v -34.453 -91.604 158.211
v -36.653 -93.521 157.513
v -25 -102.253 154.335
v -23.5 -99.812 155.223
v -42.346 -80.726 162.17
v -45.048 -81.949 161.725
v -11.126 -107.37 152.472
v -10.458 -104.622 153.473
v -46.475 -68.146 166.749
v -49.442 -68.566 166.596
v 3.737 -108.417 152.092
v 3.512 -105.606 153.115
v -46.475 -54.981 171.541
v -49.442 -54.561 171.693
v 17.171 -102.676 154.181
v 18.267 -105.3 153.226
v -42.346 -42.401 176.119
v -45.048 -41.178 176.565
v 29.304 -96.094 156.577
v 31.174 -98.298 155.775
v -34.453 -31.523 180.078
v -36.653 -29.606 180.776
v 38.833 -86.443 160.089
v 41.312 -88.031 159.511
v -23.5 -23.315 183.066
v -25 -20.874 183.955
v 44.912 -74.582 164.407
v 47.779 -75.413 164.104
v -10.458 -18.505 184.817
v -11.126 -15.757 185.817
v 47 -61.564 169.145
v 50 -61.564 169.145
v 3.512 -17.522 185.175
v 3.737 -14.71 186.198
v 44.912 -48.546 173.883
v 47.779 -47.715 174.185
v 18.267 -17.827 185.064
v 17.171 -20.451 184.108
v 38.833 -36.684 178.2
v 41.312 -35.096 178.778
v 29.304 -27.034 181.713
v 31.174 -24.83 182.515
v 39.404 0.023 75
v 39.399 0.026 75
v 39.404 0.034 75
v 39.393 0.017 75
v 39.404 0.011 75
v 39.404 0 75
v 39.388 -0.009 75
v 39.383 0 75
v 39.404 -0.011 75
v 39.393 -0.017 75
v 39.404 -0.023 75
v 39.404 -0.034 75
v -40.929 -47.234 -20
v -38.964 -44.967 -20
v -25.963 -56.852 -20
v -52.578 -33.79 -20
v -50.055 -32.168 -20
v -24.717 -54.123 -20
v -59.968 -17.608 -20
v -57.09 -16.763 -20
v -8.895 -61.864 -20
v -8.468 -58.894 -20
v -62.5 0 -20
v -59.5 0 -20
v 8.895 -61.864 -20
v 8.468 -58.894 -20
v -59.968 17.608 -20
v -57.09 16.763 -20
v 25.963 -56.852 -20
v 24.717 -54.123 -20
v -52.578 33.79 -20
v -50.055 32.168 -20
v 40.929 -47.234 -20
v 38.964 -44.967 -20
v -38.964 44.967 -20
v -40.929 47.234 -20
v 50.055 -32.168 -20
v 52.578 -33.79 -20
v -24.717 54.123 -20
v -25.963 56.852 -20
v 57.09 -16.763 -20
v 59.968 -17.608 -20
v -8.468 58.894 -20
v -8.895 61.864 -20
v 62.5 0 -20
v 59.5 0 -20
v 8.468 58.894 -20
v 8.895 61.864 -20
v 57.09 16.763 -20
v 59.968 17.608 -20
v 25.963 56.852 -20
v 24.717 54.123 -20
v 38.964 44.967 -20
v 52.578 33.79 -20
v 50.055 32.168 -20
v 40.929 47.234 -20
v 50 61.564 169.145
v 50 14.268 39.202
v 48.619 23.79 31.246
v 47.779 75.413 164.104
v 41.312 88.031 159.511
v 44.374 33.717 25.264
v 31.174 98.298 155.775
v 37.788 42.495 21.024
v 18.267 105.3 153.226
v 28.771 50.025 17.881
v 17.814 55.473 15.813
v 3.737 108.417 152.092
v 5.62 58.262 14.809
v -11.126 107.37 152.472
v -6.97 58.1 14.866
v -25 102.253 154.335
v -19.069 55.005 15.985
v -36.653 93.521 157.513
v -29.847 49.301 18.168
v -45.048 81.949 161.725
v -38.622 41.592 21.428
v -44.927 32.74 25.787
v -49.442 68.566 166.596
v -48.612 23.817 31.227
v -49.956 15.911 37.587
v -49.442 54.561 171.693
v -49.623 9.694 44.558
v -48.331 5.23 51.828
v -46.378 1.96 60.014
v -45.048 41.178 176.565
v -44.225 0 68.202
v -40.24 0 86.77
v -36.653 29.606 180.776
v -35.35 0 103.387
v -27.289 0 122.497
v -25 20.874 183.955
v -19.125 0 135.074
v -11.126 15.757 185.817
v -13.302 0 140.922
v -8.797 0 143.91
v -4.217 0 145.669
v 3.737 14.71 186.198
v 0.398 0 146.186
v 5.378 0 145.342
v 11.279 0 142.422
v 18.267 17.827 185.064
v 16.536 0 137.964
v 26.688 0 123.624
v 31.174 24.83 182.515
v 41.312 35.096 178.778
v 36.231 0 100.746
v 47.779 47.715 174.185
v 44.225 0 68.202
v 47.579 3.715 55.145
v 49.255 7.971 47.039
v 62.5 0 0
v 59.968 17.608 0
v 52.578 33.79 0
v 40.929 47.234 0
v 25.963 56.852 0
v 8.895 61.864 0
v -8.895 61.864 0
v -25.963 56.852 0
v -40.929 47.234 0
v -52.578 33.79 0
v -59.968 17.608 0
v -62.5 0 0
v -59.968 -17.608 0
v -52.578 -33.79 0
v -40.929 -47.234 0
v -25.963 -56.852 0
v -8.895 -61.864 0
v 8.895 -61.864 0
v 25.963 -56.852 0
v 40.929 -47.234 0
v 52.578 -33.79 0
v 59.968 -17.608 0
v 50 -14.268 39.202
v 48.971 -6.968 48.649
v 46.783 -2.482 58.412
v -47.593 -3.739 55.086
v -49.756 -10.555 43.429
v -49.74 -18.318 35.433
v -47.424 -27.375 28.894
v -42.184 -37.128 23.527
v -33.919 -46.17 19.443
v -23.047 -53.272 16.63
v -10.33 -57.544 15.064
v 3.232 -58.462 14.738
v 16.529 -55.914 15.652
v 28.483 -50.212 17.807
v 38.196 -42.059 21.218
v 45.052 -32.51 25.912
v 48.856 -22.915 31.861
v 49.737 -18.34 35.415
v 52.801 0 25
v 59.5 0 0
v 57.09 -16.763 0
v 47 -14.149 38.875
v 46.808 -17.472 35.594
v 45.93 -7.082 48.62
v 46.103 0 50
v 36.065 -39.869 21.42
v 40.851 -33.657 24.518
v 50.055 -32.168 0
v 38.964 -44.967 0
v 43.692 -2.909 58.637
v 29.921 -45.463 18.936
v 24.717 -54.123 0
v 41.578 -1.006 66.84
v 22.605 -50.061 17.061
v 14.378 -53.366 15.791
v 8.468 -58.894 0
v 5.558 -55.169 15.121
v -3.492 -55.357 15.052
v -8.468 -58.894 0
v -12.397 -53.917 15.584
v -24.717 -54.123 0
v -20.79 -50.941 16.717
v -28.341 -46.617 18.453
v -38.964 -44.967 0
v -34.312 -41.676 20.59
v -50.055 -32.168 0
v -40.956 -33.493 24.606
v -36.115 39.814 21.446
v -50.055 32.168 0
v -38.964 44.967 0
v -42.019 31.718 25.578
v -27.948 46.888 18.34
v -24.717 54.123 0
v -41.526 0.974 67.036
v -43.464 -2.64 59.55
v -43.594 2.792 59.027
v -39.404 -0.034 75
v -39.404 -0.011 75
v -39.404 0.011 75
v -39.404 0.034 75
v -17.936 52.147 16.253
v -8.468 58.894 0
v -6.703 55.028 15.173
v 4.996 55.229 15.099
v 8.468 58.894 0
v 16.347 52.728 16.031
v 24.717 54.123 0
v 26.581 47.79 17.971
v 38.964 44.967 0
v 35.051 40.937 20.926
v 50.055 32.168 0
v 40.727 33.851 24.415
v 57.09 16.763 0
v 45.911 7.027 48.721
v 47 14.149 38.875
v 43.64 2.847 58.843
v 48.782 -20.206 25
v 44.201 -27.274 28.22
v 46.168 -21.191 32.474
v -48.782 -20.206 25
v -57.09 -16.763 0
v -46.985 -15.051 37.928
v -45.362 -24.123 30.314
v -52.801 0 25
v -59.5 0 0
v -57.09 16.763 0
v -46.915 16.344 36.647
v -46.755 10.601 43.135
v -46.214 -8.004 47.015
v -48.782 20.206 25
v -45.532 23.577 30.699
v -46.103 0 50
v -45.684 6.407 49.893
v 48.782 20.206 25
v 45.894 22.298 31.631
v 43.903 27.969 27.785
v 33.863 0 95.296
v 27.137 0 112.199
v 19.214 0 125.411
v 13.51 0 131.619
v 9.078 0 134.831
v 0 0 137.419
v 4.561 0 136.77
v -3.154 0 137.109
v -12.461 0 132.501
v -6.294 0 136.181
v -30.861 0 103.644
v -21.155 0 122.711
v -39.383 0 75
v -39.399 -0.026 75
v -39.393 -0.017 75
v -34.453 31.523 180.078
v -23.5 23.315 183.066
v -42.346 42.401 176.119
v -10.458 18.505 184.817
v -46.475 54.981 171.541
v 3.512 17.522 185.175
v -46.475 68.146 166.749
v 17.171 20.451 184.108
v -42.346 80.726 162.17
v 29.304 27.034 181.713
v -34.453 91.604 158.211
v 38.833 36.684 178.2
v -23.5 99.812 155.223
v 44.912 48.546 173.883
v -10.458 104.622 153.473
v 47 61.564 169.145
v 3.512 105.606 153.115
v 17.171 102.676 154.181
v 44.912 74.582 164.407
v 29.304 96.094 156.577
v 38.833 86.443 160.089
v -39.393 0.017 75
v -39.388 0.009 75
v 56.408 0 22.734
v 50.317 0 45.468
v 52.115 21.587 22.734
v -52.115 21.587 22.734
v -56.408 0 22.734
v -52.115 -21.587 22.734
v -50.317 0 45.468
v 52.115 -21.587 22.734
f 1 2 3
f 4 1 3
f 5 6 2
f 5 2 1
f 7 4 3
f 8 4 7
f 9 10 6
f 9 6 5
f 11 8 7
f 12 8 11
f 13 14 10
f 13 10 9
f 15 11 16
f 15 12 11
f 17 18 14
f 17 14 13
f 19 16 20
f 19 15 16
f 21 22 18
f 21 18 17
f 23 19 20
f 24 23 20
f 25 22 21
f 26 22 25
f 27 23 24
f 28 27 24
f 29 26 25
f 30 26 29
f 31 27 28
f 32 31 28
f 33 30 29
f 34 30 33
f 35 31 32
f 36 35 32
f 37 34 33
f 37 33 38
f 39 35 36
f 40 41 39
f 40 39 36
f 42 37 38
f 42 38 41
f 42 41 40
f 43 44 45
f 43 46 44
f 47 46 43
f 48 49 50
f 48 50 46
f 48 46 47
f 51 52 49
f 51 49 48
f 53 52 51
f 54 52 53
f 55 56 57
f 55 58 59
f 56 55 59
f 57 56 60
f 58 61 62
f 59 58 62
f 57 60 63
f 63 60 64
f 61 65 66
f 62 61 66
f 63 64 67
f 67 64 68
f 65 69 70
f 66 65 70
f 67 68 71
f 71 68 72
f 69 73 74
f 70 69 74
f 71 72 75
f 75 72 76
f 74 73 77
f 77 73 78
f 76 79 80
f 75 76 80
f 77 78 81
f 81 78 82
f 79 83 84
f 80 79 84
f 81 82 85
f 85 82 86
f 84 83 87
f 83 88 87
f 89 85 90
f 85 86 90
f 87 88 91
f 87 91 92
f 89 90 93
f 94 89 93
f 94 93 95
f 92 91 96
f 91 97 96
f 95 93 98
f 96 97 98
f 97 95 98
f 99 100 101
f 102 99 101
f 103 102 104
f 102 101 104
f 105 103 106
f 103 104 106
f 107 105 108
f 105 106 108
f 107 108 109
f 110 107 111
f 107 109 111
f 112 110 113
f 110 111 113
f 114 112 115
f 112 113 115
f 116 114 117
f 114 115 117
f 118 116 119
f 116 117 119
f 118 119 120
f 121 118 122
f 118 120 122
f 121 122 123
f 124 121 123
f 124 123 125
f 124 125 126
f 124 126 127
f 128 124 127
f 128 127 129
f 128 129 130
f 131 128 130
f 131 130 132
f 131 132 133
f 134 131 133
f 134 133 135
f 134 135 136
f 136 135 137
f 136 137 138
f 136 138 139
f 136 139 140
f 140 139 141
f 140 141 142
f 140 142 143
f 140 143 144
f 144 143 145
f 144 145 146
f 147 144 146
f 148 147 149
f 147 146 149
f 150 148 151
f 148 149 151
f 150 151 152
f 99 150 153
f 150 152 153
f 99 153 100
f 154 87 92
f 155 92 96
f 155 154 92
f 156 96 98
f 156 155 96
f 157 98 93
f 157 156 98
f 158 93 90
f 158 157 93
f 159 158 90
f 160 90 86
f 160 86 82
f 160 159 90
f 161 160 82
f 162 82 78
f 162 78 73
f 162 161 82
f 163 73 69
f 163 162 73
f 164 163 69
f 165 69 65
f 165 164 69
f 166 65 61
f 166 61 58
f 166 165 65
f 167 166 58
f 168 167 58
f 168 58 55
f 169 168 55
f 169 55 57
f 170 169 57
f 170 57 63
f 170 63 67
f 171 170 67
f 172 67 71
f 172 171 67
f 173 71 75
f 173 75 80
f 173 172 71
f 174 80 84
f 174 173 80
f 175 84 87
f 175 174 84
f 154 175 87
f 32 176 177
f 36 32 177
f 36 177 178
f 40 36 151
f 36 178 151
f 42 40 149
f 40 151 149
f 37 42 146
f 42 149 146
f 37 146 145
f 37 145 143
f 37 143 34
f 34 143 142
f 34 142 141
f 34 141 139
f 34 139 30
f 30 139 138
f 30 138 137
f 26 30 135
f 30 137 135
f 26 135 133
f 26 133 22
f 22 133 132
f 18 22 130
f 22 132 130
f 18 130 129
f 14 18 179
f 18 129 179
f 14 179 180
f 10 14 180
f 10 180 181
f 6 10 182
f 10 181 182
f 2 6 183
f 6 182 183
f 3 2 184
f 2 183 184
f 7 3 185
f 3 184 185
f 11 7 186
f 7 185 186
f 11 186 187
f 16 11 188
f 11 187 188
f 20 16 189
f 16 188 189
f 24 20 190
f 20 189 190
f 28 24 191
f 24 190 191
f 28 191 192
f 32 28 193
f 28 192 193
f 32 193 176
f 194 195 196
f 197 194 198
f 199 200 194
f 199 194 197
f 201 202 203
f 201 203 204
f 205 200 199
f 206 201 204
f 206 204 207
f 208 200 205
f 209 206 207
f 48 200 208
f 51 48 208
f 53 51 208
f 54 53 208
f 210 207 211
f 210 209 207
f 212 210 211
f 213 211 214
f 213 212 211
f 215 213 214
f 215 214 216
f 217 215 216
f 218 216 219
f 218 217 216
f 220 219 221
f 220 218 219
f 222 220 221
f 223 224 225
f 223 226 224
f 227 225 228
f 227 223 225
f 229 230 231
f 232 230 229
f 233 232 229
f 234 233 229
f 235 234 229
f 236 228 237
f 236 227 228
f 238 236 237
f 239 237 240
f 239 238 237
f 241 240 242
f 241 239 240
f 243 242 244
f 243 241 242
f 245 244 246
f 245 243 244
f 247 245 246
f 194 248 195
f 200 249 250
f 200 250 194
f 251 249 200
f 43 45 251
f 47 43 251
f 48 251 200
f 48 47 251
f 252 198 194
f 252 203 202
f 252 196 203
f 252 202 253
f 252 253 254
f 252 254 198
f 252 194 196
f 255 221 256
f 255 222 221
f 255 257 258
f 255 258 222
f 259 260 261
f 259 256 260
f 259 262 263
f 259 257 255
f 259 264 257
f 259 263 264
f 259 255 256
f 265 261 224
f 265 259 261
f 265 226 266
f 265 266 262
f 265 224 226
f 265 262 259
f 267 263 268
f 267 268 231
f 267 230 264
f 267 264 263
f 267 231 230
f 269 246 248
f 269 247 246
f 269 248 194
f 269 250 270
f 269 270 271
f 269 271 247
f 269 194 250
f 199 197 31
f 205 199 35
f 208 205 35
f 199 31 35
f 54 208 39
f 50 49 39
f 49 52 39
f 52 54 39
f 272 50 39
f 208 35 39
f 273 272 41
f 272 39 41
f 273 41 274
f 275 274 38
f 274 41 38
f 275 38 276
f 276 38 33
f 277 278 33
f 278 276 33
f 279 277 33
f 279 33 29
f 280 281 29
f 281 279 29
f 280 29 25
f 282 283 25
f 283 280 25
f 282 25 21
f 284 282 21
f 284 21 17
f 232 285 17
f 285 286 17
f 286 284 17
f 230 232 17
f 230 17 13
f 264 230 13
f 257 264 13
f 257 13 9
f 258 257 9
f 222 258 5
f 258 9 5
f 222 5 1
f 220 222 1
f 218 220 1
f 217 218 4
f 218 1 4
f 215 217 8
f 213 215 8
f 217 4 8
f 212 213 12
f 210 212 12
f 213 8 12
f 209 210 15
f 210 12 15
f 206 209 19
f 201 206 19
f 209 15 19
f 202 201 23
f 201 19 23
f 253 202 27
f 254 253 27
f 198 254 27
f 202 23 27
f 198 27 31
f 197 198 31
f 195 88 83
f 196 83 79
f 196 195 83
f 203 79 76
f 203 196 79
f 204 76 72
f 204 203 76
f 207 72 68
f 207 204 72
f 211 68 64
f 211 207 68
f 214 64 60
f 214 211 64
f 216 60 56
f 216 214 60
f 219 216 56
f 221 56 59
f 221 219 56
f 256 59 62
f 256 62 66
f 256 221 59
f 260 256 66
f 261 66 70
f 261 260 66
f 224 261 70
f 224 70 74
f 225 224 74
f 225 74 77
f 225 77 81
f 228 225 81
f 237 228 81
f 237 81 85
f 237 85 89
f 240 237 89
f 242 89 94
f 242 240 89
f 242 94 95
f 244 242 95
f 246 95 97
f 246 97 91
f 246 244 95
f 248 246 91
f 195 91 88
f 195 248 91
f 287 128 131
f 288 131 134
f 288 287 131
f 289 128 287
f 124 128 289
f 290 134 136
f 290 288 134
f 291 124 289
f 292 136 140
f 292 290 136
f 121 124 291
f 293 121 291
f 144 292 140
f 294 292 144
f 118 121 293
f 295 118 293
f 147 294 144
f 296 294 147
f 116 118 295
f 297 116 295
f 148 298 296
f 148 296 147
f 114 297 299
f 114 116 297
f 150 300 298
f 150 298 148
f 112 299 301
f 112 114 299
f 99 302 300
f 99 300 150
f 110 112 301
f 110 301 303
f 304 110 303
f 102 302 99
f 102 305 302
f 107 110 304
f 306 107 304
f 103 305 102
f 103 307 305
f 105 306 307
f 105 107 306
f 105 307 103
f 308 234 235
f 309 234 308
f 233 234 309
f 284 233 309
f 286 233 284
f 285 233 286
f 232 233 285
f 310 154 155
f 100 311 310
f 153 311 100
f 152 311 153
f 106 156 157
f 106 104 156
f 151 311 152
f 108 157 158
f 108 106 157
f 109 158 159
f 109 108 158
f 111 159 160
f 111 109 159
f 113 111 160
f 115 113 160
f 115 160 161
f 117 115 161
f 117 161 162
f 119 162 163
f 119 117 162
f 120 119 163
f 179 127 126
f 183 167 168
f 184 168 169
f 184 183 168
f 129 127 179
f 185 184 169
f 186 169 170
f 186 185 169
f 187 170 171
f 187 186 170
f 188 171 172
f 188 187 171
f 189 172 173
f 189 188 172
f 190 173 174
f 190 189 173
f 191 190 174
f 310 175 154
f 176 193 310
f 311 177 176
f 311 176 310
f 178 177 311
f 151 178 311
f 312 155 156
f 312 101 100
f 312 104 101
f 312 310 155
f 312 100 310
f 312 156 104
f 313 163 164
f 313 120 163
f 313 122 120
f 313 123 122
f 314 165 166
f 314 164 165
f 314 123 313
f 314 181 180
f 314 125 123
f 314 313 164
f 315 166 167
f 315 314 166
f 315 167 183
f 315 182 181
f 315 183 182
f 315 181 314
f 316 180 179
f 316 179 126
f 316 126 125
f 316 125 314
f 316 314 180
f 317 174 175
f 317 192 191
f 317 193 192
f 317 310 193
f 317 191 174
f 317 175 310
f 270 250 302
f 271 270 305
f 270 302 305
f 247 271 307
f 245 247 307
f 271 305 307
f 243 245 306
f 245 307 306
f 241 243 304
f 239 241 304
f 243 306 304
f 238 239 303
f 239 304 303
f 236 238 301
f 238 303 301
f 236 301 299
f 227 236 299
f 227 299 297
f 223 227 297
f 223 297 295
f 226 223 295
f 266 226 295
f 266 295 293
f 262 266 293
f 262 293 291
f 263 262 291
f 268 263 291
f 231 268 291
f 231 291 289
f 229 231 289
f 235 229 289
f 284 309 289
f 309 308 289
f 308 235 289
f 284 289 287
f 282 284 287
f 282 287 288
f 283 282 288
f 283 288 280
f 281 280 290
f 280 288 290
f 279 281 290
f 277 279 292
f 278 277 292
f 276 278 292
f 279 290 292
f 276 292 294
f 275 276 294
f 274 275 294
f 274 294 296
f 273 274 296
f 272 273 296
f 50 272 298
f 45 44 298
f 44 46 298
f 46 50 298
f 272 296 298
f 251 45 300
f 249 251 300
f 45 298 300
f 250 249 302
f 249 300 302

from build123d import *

# Parameters (mm, degrees)
SKETCH_R        = 62.5
PAD_DEPTH       = 100
PAD_TAPER       = 15
SKETCH001_R     = 50
PAD001_DEPTH    = 180
SKETCH002_R     = 50
PAD002_DEPTH    = 180
SKETCH003_R     = 47
POCKET_DEPTH    = 233.196381
SKETCH004_R     = 47
POCKET001_DEPTH = 233.196381
SKETCH005_R     = 59.5
POCKET002_DEPTH = 75
POCKET002_TAPER = 15
PAD003_DEPTH    = 20
POCKET003_DEPTH = 20


with BuildPart() as part:
    # Sketch → Pad (new body)
    with BuildSketch(Plane.XY):
        Circle(SKETCH_R)
    extrude(amount=PAD_DEPTH, taper=PAD_TAPER)

    # Sketch001 (on DatumPlane) → Pad001 (join)
    with BuildSketch(Plane(origin=(0, 0, 0), x_dir=(1, 0, 0), z_dir=(0, 0.34202, 0.939693))):
        Circle(SKETCH001_R)
    extrude(amount=PAD001_DEPTH)

    # Sketch002 (on DatumPlane) → Pad002 (join)
    with BuildSketch(Plane(origin=(0, 0, 0), x_dir=(1, 0, 0), z_dir=(0, -0.34202, 0.939693))):
        Circle(SKETCH002_R)
    extrude(amount=PAD002_DEPTH)

    # Sketch003 (on Face7 of Pad002) → Pocket (cut, through all)
    with BuildSketch(Plane(origin=(0, 61.563626, 169.144672), x_dir=(1, 0, 0), z_dir=(0, 0.34202, 0.939693))):
        Circle(SKETCH003_R)
    extrude(amount=-POCKET_DEPTH, mode=Mode.SUBTRACT)

    # Sketch004 (on Face8 of Pocket) → Pocket001 (cut, through all)
    with BuildSketch(Plane(origin=(0, -61.563626, 169.144672), x_dir=(1, 0, 0), z_dir=(0, -0.34202, 0.939693))):
        Circle(SKETCH004_R)
    extrude(amount=-POCKET001_DEPTH, mode=Mode.SUBTRACT)

    # Sketch005 (on Face2 of Pocket001) → Pocket002 (cut)
    with BuildSketch(Plane(origin=(0, 0, 0), x_dir=(1, 0, 0), z_dir=(0, 0, -1))):
        Circle(SKETCH005_R)
    extrude(amount=-POCKET002_DEPTH, taper=POCKET002_TAPER, mode=Mode.SUBTRACT)

    # Sketch → Pad003 (join)
    with BuildSketch(Plane.XY):
        Circle(SKETCH_R)
    extrude(amount=-PAD003_DEPTH)

    # Sketch005 (on Face2 of Pocket001) → Pocket003 (cut)
    with BuildSketch(Plane(origin=(0, 0, 0), x_dir=(1, 0, 0), z_dir=(0, 0, -1))):
        Circle(SKETCH005_R)
    extrude(amount=POCKET003_DEPTH, mode=Mode.SUBTRACT)


solid = part.part
